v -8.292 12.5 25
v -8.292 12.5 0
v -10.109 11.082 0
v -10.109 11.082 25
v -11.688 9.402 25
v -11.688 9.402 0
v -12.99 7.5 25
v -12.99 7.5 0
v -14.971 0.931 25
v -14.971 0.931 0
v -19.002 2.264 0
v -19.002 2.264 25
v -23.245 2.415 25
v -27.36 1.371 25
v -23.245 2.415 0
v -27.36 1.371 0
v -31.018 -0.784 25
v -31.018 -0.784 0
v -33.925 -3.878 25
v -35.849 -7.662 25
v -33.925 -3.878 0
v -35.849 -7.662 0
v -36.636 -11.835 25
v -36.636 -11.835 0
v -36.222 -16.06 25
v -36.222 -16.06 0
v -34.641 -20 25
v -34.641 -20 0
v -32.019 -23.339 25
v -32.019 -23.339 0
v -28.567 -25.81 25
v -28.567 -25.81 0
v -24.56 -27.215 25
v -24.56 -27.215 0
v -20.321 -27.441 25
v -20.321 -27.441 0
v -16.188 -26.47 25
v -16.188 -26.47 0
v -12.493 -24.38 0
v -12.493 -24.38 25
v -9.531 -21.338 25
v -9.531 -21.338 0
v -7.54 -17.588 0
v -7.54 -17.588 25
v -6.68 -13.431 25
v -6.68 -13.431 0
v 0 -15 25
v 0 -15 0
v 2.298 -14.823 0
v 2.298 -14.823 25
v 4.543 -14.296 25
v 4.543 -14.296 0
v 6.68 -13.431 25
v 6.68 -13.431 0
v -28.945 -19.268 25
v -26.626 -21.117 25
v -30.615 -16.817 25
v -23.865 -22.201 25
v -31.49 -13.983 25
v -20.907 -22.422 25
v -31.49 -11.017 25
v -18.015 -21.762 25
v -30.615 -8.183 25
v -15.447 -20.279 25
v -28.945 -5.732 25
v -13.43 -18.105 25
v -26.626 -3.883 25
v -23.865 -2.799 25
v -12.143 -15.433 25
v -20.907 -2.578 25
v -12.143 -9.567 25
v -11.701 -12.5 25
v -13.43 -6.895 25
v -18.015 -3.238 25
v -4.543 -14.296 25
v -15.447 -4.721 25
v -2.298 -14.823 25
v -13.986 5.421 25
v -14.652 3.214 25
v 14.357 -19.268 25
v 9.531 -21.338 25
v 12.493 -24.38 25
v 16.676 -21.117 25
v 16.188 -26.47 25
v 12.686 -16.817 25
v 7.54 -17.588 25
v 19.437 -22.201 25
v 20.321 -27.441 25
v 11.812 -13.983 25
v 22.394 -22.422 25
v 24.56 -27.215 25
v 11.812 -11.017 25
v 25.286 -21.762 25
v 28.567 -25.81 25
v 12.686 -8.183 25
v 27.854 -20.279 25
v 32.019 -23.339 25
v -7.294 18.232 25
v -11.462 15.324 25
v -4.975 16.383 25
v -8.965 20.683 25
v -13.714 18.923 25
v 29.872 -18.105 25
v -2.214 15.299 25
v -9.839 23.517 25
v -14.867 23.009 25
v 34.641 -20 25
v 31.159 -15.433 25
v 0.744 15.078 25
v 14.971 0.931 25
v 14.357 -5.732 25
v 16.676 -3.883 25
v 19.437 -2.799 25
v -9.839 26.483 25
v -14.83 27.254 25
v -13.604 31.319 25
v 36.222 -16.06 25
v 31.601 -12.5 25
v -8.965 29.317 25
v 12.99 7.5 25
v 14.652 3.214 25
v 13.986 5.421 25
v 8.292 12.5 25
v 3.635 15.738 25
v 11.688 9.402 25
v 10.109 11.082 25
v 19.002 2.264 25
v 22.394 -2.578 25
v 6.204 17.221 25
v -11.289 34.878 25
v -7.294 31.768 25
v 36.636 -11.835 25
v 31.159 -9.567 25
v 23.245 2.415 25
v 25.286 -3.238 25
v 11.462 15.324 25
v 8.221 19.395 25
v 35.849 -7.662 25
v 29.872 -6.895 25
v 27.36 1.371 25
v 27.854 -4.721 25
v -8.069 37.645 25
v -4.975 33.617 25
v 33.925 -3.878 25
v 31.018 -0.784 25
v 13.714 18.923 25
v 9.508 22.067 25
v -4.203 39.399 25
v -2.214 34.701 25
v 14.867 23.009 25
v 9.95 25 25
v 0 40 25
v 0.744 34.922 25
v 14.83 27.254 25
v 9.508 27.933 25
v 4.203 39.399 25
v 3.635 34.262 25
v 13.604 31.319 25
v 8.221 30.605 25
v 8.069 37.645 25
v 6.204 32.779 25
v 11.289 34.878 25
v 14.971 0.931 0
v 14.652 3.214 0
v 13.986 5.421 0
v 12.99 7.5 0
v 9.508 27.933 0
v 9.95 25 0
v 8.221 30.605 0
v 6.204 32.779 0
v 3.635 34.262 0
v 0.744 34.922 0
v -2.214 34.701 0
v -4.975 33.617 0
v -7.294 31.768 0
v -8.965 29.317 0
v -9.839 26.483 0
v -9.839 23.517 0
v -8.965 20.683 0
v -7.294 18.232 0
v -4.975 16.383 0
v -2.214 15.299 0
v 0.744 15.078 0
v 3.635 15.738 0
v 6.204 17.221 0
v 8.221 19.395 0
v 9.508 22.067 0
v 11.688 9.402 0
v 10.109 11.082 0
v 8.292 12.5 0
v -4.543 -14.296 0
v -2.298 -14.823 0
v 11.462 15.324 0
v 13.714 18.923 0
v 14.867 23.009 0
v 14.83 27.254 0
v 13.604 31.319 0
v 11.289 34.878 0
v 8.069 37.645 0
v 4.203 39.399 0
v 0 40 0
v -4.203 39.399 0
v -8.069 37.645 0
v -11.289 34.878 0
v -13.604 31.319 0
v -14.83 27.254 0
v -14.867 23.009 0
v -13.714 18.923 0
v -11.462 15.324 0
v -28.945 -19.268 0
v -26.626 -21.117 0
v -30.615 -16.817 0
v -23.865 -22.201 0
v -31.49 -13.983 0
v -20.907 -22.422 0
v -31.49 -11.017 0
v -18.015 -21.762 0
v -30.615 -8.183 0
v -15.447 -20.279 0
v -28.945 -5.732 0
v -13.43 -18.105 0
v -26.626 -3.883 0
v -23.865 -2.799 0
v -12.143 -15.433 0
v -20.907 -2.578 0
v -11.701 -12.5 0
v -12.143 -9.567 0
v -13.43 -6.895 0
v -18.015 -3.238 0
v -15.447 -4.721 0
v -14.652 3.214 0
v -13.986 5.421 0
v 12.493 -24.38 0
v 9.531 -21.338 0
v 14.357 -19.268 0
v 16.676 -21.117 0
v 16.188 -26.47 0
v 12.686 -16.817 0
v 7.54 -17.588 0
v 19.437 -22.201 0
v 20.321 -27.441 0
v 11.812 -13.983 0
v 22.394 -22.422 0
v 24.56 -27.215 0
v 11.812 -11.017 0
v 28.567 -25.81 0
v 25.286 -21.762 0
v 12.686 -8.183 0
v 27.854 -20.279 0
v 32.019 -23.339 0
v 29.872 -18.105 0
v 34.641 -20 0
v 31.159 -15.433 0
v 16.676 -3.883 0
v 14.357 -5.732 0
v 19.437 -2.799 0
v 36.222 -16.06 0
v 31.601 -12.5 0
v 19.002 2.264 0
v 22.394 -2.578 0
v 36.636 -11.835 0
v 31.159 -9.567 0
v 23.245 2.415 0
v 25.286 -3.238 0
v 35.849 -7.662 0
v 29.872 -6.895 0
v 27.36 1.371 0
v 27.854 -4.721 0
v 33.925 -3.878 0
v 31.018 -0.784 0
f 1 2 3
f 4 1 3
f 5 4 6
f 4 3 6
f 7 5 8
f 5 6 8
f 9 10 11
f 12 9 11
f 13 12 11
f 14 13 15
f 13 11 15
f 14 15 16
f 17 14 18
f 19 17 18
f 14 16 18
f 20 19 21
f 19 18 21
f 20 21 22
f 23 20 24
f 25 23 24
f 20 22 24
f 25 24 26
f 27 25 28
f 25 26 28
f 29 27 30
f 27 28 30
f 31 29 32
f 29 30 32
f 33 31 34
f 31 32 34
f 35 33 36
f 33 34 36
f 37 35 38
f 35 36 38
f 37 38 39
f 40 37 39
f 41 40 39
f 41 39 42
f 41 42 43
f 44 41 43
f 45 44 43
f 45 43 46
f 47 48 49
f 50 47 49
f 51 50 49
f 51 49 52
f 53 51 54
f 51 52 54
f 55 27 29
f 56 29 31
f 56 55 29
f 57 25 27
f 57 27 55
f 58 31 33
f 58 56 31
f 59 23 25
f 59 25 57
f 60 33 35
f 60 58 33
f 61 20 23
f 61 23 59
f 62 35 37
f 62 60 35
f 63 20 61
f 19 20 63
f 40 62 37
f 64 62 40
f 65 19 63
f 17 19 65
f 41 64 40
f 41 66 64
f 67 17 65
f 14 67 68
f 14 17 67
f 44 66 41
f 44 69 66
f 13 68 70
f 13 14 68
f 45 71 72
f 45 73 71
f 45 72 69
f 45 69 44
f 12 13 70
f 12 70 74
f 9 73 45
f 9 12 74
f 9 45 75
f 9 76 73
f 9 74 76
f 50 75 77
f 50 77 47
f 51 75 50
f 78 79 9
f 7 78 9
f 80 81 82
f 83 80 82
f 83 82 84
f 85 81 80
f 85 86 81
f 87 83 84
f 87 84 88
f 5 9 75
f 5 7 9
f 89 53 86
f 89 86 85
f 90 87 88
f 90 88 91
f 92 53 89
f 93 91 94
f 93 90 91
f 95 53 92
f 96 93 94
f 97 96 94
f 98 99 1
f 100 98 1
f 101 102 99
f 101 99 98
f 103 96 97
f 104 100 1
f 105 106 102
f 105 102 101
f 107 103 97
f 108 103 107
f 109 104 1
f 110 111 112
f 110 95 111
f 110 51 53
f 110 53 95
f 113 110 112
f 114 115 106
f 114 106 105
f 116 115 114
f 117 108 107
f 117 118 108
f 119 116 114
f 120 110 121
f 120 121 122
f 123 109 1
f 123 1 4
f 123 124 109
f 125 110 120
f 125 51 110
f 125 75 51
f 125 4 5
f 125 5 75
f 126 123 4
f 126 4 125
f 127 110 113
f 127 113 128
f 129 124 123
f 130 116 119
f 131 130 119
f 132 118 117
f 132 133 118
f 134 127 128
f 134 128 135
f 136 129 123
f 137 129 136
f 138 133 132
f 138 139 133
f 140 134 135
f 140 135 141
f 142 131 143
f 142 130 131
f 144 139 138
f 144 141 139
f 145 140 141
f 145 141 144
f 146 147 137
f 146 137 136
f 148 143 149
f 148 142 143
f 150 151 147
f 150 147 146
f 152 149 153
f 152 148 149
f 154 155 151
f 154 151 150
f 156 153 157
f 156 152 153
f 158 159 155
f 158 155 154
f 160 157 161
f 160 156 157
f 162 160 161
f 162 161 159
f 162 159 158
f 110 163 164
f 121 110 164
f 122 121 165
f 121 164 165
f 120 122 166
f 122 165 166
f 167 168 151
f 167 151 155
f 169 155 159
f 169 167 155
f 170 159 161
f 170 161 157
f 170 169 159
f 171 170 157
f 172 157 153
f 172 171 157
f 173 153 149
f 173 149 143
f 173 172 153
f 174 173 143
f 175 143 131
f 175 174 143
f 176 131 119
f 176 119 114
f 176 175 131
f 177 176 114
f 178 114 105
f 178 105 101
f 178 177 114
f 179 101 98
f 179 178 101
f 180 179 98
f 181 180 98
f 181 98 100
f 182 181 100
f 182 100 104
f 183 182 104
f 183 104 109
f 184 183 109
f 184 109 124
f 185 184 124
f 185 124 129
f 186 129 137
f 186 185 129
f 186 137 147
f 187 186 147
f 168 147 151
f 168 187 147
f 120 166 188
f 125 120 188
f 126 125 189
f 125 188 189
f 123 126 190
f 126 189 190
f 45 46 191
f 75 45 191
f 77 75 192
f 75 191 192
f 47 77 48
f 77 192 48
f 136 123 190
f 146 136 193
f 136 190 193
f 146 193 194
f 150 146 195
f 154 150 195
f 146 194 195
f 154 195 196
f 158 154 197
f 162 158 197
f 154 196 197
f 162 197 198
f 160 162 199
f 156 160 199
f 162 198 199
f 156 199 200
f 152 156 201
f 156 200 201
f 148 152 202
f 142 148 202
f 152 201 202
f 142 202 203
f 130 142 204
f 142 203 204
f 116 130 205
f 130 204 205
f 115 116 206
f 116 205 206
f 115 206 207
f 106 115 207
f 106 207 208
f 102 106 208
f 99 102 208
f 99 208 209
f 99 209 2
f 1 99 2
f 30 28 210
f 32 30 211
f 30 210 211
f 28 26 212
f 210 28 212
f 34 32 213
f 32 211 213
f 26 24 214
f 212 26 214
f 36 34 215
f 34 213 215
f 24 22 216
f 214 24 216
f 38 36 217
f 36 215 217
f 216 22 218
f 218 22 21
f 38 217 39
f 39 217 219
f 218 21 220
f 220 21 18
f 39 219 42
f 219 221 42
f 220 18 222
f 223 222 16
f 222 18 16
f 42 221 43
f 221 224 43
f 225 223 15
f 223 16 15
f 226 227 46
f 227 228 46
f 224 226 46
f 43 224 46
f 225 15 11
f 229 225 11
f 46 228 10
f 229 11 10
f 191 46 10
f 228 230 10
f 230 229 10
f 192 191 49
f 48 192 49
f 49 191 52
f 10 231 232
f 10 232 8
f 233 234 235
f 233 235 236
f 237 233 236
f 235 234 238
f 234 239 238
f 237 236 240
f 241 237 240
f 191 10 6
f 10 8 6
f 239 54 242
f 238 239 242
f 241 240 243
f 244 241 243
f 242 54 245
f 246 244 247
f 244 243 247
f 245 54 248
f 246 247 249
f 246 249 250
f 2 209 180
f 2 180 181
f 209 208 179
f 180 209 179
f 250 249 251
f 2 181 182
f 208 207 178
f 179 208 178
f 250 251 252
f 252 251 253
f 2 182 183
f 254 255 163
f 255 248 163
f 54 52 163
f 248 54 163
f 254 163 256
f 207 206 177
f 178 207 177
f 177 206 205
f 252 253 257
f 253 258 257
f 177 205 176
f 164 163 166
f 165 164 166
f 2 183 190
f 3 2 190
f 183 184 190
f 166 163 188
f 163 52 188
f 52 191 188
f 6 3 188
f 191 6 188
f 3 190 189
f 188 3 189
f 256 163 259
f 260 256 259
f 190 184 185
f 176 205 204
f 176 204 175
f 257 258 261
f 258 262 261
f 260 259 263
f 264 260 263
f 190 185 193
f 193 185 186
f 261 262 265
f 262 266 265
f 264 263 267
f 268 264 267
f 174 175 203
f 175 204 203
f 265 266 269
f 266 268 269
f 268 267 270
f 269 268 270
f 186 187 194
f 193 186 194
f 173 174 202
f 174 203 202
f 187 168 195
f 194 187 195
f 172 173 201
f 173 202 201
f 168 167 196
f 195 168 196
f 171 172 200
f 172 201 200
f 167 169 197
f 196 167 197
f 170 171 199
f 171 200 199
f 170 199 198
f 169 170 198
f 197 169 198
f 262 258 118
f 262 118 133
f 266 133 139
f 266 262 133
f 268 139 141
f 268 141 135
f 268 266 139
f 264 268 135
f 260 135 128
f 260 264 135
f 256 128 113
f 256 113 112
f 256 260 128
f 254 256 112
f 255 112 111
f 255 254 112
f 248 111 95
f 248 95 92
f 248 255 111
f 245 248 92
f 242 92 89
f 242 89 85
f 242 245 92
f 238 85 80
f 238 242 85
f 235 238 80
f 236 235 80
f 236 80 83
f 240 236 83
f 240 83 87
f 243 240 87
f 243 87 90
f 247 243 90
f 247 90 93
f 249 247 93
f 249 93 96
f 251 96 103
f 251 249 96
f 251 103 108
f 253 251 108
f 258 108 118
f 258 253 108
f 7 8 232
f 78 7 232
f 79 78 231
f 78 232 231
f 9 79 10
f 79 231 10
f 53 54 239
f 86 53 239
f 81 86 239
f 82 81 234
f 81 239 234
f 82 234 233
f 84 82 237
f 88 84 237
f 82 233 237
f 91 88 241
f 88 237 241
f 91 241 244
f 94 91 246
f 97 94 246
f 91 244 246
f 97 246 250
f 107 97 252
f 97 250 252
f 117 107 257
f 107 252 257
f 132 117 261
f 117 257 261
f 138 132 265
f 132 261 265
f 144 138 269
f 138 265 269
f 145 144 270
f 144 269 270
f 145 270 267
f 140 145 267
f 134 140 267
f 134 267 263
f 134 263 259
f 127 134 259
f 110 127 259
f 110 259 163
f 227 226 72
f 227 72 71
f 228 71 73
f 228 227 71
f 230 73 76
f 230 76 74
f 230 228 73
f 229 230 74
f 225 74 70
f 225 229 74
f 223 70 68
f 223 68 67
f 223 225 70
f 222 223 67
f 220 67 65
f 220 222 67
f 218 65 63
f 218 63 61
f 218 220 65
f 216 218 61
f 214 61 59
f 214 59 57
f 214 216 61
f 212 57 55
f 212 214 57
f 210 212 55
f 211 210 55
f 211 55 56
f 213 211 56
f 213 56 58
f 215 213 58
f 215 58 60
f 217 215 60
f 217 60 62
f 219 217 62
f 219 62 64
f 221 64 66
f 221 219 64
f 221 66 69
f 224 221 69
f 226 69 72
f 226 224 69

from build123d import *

# Parameters (mm, degrees)
F0_R     = 9.95
F1_DEPTH = 25


with BuildPart() as f1:
    # F0 (on Top) → F1 (new body)
    with BuildSketch(Plane.XY):
        with BuildLine():
            ThreePointArc((8.291562, 12.5), (0, 40), (-8.291562, 12.5))
            ThreePointArc((-8.291562, 12.5), (-10.930703, 10.272279), (-12.990381, 7.5))
            ThreePointArc((-12.990381, 7.5), (-14.361407, 4.330127), (-14.971099, 0.930703))
            ThreePointArc((-14.971099, 0.930703), (-34.641016, -20), (-6.679537, -13.430703))
            ThreePointArc((-6.679537, -13.430703), (-3.430703, -14.602406), (0, -15))
            ThreePointArc((0, -15), (3.430703, -14.602406), (6.679537, -13.430703))
            ThreePointArc((6.679537, -13.430703), (34.641016, -20), (14.971099, 0.930703))
            ThreePointArc((14.971099, 0.930703), (14.361407, 4.330127), (12.990381, 7.5))
            ThreePointArc((12.990381, 7.5), (10.930703, 10.272279), (8.291562, 12.5))
        make_face()
        with Locations((-21.650635, -12.5)):
            Circle(F0_R, mode=Mode.SUBTRACT)
        with Locations((21.650635, -12.5)):
            Circle(F0_R, mode=Mode.SUBTRACT)
        with Locations((0, 25)):
            Circle(F0_R, mode=Mode.SUBTRACT)
    extrude(amount=F1_DEPTH)


solid = f1.part
